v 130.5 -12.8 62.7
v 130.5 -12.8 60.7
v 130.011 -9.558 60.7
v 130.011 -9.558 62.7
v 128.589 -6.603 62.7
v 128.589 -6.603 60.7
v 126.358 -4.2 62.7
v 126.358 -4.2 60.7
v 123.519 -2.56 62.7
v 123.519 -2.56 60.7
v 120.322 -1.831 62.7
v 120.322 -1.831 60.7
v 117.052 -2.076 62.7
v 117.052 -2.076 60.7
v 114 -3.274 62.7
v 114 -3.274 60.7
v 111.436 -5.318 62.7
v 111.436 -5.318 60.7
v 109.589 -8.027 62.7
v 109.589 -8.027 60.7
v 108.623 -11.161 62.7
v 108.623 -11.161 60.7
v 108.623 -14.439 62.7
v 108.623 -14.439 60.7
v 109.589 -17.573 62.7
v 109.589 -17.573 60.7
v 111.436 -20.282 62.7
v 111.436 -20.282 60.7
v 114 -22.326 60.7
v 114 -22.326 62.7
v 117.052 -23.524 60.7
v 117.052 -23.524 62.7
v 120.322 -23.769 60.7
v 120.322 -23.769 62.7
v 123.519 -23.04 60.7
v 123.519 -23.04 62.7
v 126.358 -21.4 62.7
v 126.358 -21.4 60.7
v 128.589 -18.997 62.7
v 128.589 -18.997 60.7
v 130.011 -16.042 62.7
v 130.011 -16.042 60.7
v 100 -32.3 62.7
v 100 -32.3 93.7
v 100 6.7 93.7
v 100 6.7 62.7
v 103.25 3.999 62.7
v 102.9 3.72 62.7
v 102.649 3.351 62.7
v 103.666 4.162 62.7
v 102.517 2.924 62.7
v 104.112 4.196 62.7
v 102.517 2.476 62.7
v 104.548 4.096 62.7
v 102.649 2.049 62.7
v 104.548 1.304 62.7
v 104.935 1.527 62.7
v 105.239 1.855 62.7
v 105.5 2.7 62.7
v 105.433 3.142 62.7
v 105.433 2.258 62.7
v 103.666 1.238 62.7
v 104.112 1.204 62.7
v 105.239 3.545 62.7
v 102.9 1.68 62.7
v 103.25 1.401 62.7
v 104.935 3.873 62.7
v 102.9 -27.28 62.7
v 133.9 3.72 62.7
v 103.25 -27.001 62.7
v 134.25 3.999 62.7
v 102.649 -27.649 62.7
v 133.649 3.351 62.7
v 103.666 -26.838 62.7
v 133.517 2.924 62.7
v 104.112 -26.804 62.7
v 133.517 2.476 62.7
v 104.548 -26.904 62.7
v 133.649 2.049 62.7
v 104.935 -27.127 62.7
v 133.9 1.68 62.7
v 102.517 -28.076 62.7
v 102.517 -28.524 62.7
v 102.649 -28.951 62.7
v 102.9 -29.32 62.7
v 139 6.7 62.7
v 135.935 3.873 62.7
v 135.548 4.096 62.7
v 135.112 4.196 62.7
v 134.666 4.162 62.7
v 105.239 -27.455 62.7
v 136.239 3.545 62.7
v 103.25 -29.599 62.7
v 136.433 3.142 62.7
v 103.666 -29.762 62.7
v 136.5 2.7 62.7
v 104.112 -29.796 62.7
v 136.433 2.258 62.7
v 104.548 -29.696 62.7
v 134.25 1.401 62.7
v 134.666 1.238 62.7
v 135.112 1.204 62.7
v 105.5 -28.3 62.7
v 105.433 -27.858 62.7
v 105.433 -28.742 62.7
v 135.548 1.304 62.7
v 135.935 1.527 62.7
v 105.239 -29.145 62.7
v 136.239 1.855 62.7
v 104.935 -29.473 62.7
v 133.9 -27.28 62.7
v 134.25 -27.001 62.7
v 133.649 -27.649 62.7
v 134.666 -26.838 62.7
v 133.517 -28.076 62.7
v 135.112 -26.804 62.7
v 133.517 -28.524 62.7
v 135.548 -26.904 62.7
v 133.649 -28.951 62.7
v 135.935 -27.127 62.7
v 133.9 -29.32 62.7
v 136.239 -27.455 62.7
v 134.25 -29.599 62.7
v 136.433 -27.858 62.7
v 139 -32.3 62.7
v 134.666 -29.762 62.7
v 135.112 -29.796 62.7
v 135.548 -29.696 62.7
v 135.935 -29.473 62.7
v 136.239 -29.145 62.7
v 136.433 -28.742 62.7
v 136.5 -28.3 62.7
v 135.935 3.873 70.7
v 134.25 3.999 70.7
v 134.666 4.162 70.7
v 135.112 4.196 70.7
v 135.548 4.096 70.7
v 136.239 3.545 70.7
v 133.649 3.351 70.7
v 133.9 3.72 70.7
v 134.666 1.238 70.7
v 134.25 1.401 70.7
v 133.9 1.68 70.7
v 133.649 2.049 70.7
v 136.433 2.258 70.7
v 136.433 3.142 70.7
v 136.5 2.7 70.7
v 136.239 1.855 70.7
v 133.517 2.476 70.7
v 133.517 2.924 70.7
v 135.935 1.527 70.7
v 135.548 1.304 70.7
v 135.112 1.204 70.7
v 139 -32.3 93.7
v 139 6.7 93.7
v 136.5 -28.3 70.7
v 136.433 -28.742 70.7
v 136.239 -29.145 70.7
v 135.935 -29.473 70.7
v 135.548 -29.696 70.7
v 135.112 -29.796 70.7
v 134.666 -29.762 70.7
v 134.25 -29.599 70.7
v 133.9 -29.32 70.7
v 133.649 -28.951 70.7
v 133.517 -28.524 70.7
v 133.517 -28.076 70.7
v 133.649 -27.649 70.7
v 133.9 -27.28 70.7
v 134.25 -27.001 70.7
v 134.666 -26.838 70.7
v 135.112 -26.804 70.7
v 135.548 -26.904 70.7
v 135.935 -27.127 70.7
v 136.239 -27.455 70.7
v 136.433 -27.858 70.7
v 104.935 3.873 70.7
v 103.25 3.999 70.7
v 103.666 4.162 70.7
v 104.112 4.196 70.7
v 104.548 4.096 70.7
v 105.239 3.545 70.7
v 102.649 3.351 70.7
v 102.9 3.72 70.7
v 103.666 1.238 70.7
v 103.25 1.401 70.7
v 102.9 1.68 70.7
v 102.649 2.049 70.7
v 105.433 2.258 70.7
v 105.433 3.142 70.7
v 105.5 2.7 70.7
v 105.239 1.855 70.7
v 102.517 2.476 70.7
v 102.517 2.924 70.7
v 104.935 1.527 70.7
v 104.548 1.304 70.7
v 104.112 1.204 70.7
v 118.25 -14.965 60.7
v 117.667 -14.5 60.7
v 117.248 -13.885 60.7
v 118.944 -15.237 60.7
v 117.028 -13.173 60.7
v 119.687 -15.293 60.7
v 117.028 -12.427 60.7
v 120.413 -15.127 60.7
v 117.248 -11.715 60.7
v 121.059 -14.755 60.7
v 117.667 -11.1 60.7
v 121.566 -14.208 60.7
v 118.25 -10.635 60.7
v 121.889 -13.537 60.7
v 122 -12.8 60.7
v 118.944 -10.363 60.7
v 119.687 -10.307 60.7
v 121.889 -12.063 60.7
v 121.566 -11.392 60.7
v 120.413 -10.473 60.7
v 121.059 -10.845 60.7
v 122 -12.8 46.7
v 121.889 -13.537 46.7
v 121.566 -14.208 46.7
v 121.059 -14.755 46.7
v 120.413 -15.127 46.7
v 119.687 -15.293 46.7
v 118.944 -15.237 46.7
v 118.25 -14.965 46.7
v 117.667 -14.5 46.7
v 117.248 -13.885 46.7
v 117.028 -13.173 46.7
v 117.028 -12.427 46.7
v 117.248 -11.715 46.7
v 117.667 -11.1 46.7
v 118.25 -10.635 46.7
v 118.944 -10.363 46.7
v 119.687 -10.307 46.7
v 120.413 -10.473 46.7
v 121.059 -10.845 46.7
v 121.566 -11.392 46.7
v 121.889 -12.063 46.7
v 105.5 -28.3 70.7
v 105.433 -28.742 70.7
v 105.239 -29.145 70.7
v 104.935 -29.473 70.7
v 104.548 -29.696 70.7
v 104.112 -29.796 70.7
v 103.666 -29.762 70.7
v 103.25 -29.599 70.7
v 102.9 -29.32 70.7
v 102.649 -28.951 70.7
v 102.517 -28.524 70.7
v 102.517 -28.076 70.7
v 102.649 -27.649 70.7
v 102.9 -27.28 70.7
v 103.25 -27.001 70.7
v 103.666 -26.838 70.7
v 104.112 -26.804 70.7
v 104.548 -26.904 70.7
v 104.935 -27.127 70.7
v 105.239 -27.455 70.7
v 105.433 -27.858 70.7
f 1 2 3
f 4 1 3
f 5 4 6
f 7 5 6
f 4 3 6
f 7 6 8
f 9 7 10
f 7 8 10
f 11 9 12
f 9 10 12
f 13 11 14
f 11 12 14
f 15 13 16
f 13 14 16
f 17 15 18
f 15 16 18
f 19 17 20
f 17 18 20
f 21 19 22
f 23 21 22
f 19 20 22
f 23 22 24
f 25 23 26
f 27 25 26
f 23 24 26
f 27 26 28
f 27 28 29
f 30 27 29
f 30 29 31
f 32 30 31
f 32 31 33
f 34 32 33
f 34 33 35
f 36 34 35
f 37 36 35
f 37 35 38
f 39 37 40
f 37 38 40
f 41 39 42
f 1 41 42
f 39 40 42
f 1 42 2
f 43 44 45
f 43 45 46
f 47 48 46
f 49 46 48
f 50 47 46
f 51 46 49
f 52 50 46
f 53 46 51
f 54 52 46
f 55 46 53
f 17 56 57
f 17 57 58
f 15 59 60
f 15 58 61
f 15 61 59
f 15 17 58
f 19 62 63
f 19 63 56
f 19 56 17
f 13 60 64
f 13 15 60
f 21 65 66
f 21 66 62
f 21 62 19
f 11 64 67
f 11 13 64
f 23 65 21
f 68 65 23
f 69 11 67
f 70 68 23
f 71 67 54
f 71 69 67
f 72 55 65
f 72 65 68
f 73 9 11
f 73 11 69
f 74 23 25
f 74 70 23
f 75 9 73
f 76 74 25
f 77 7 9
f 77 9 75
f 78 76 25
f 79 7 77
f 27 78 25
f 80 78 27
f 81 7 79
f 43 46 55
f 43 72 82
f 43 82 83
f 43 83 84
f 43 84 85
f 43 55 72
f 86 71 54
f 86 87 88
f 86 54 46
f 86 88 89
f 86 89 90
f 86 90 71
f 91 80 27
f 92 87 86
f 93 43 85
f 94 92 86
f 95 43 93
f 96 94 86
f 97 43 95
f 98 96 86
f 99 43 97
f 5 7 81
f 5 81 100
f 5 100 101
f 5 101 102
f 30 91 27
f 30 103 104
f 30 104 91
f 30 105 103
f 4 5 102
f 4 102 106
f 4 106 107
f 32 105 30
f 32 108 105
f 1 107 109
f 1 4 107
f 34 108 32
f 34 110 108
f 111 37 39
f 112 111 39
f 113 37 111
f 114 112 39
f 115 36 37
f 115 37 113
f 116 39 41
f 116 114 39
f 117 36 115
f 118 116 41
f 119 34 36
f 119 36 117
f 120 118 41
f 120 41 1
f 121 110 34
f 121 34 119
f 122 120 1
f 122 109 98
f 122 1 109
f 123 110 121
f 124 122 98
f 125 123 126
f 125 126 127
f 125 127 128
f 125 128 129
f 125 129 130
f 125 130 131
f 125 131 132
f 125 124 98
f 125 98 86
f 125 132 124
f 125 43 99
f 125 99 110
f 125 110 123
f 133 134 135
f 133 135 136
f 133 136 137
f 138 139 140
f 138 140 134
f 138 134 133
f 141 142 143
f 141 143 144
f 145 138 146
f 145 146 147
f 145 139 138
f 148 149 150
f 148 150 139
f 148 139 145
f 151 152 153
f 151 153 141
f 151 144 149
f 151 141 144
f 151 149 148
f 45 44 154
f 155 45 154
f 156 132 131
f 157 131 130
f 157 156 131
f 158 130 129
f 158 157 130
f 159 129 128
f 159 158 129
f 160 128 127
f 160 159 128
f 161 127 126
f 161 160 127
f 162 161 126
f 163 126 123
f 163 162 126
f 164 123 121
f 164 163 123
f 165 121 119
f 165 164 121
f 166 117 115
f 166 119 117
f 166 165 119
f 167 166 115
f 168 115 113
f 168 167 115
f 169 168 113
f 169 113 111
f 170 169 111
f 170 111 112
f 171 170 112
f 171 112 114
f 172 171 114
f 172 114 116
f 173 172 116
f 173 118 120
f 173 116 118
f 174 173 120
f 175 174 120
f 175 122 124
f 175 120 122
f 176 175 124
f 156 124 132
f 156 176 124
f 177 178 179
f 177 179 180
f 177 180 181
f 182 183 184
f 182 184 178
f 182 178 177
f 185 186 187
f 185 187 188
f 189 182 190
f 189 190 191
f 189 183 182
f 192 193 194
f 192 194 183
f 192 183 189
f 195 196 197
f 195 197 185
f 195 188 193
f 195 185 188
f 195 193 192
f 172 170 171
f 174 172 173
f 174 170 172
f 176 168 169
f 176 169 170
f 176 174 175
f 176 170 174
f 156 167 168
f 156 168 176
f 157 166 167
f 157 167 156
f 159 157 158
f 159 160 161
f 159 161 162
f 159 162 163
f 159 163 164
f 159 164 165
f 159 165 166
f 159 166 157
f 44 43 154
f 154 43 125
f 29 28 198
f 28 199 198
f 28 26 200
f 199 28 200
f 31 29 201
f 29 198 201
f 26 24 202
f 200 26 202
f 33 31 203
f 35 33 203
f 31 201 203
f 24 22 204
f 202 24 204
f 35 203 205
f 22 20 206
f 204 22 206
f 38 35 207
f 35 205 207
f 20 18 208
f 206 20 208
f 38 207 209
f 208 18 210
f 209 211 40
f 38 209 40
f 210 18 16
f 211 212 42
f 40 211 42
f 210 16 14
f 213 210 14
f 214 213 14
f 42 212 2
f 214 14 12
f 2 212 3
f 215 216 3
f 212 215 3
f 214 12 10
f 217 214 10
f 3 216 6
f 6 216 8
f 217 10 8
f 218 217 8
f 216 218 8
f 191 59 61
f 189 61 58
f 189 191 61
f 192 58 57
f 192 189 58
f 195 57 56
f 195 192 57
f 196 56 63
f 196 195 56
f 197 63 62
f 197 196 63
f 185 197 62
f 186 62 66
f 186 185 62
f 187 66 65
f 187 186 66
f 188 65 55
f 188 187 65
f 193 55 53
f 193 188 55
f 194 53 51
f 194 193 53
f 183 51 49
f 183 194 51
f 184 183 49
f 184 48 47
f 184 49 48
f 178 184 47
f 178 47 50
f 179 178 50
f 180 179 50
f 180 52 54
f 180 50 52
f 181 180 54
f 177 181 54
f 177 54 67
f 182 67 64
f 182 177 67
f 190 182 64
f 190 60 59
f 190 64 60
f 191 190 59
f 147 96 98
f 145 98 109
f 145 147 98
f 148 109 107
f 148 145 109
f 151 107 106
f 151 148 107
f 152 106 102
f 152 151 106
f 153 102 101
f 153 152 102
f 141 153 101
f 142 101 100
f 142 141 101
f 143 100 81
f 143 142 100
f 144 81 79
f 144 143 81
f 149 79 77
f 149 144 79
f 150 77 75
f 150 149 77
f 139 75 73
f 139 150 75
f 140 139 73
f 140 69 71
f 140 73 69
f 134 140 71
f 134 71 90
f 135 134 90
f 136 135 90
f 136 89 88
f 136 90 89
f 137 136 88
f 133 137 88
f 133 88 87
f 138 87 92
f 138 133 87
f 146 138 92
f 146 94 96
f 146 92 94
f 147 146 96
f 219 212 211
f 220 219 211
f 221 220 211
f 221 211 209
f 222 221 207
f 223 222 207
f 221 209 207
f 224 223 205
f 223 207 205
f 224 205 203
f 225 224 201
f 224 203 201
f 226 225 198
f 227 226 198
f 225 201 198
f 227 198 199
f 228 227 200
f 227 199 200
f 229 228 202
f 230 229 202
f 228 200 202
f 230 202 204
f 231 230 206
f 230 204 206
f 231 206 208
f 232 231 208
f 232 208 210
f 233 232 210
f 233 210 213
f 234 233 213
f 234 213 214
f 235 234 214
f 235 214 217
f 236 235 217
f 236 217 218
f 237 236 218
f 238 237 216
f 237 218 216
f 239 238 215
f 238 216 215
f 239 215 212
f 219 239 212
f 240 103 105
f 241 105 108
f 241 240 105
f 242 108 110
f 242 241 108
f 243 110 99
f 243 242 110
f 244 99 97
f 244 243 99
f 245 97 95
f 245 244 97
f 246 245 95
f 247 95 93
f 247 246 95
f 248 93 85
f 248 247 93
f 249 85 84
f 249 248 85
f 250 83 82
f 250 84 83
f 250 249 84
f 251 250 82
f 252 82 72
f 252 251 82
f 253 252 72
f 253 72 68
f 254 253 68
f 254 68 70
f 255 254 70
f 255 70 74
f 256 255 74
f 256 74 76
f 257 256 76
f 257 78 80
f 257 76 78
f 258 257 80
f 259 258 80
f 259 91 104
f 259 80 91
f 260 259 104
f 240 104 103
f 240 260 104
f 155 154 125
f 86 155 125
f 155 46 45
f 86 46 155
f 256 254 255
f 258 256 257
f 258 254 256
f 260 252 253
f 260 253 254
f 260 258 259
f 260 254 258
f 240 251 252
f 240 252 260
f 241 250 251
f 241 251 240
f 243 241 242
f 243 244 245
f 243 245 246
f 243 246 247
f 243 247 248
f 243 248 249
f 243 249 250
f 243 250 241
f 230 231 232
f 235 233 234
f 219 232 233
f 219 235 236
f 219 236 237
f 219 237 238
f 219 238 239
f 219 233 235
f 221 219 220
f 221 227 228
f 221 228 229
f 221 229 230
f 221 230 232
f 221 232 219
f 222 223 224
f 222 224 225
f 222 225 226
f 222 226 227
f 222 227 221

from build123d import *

# Parameters (mm, degrees)
CYLINDER013_R             = 11
CYLINDER013_DEPTH         = 2
CYLINDER014_R             = 2.5
CYLINDER014_DEPTH         = 14
CYLINDER010_R             = 1.5
CYLINDER010_DEPTH         = 10
CYLINDER011_R             = 1.5
CYLINDER011_DEPTH         = 10
CYLINDER012_R             = 1.5
CYLINDER012_DEPTH         = 10
CYLINDER009_R             = 1.5
CYLINDER009_DEPTH         = 10
BOX001_W                  = 39
BOX001_H                  = 31
BOX001_DEPTH              = 39
FUSION001_PLACEMENT_ANGLE = 90


with BuildPart() as cylinder013:
    # Cylinder013 → Cylinder013 (new body)
    with BuildSketch(Plane(origin=(19.5, 33, 19.5), x_dir=(1, 0, 0), z_dir=(0, -1, 0))):
        Circle(CYLINDER013_R)
    extrude(amount=CYLINDER013_DEPTH)


with BuildPart() as cylinder014:
    # Cylinder014 → Cylinder014 (new body)
    with BuildSketch(Plane(origin=(19.5, 33, 19.5), x_dir=(1, 0, 0), z_dir=(0, 1, 0))):
        Circle(CYLINDER014_R)
    extrude(amount=CYLINDER014_DEPTH)


with BuildPart() as cylinder010:
    # Cylinder010 → Cylinder010 (new body)
    with BuildSketch(Plane(origin=(35, 23, 35), x_dir=(1, 0, 0), z_dir=(0, 1, 0))):
        Circle(CYLINDER010_R)
    extrude(amount=CYLINDER010_DEPTH)


with BuildPart() as cylinder011:
    # Cylinder011 → Cylinder011 (new body)
    with BuildSketch(Plane(origin=(35, 23, 4), x_dir=(1, 0, 0), z_dir=(0, 1, 0))):
        Circle(CYLINDER011_R)
    extrude(amount=CYLINDER011_DEPTH)


with BuildPart() as cylinder012:
    # Cylinder012 → Cylinder012 (new body)
    with BuildSketch(Plane(origin=(4, 23, 4), x_dir=(1, 0, 0), z_dir=(0, 1, 0))):
        Circle(CYLINDER012_R)
    extrude(amount=CYLINDER012_DEPTH)


with BuildPart() as cylinder009:
    # Cylinder009 → Cylinder009 (new body)
    with BuildSketch(Plane(origin=(4, 23, 35), x_dir=(1, 0, 0), z_dir=(0, 1, 0))):
        Circle(CYLINDER009_R)
    extrude(amount=CYLINDER009_DEPTH)


with BuildPart() as fusion001:
    # Box001 → Box001 (new body)
    with BuildSketch(Plane.XY):
        with Locations((19.5, 15.5)):
            Rectangle(BOX001_W, BOX001_H)
    extrude(amount=BOX001_DEPTH)

    # Cut005: cut Cylinder009
    add(cylinder009.part, mode=Mode.SUBTRACT)

    # Cut006: cut Cylinder012
    add(cylinder012.part, mode=Mode.SUBTRACT)

    # Cut007: cut Cylinder011
    add(cylinder011.part, mode=Mode.SUBTRACT)

    # Cut008: cut Cylinder010
    add(cylinder010.part, mode=Mode.SUBTRACT)

    # Fusion001: union Cylinder013, Cylinder014
    add(cylinder013.part)
    add(cylinder014.part)


with BuildPart() as fusion001_1:
    # Fusion001 placement: moved
    add(fusion001.part.moved(Location((100, -32.3, 93.7))).rotate(Axis((100, -32.3, 93.7), (-1, 0, 0)), FUSION001_PLACEMENT_ANGLE))


solid = fusion001_1.part
